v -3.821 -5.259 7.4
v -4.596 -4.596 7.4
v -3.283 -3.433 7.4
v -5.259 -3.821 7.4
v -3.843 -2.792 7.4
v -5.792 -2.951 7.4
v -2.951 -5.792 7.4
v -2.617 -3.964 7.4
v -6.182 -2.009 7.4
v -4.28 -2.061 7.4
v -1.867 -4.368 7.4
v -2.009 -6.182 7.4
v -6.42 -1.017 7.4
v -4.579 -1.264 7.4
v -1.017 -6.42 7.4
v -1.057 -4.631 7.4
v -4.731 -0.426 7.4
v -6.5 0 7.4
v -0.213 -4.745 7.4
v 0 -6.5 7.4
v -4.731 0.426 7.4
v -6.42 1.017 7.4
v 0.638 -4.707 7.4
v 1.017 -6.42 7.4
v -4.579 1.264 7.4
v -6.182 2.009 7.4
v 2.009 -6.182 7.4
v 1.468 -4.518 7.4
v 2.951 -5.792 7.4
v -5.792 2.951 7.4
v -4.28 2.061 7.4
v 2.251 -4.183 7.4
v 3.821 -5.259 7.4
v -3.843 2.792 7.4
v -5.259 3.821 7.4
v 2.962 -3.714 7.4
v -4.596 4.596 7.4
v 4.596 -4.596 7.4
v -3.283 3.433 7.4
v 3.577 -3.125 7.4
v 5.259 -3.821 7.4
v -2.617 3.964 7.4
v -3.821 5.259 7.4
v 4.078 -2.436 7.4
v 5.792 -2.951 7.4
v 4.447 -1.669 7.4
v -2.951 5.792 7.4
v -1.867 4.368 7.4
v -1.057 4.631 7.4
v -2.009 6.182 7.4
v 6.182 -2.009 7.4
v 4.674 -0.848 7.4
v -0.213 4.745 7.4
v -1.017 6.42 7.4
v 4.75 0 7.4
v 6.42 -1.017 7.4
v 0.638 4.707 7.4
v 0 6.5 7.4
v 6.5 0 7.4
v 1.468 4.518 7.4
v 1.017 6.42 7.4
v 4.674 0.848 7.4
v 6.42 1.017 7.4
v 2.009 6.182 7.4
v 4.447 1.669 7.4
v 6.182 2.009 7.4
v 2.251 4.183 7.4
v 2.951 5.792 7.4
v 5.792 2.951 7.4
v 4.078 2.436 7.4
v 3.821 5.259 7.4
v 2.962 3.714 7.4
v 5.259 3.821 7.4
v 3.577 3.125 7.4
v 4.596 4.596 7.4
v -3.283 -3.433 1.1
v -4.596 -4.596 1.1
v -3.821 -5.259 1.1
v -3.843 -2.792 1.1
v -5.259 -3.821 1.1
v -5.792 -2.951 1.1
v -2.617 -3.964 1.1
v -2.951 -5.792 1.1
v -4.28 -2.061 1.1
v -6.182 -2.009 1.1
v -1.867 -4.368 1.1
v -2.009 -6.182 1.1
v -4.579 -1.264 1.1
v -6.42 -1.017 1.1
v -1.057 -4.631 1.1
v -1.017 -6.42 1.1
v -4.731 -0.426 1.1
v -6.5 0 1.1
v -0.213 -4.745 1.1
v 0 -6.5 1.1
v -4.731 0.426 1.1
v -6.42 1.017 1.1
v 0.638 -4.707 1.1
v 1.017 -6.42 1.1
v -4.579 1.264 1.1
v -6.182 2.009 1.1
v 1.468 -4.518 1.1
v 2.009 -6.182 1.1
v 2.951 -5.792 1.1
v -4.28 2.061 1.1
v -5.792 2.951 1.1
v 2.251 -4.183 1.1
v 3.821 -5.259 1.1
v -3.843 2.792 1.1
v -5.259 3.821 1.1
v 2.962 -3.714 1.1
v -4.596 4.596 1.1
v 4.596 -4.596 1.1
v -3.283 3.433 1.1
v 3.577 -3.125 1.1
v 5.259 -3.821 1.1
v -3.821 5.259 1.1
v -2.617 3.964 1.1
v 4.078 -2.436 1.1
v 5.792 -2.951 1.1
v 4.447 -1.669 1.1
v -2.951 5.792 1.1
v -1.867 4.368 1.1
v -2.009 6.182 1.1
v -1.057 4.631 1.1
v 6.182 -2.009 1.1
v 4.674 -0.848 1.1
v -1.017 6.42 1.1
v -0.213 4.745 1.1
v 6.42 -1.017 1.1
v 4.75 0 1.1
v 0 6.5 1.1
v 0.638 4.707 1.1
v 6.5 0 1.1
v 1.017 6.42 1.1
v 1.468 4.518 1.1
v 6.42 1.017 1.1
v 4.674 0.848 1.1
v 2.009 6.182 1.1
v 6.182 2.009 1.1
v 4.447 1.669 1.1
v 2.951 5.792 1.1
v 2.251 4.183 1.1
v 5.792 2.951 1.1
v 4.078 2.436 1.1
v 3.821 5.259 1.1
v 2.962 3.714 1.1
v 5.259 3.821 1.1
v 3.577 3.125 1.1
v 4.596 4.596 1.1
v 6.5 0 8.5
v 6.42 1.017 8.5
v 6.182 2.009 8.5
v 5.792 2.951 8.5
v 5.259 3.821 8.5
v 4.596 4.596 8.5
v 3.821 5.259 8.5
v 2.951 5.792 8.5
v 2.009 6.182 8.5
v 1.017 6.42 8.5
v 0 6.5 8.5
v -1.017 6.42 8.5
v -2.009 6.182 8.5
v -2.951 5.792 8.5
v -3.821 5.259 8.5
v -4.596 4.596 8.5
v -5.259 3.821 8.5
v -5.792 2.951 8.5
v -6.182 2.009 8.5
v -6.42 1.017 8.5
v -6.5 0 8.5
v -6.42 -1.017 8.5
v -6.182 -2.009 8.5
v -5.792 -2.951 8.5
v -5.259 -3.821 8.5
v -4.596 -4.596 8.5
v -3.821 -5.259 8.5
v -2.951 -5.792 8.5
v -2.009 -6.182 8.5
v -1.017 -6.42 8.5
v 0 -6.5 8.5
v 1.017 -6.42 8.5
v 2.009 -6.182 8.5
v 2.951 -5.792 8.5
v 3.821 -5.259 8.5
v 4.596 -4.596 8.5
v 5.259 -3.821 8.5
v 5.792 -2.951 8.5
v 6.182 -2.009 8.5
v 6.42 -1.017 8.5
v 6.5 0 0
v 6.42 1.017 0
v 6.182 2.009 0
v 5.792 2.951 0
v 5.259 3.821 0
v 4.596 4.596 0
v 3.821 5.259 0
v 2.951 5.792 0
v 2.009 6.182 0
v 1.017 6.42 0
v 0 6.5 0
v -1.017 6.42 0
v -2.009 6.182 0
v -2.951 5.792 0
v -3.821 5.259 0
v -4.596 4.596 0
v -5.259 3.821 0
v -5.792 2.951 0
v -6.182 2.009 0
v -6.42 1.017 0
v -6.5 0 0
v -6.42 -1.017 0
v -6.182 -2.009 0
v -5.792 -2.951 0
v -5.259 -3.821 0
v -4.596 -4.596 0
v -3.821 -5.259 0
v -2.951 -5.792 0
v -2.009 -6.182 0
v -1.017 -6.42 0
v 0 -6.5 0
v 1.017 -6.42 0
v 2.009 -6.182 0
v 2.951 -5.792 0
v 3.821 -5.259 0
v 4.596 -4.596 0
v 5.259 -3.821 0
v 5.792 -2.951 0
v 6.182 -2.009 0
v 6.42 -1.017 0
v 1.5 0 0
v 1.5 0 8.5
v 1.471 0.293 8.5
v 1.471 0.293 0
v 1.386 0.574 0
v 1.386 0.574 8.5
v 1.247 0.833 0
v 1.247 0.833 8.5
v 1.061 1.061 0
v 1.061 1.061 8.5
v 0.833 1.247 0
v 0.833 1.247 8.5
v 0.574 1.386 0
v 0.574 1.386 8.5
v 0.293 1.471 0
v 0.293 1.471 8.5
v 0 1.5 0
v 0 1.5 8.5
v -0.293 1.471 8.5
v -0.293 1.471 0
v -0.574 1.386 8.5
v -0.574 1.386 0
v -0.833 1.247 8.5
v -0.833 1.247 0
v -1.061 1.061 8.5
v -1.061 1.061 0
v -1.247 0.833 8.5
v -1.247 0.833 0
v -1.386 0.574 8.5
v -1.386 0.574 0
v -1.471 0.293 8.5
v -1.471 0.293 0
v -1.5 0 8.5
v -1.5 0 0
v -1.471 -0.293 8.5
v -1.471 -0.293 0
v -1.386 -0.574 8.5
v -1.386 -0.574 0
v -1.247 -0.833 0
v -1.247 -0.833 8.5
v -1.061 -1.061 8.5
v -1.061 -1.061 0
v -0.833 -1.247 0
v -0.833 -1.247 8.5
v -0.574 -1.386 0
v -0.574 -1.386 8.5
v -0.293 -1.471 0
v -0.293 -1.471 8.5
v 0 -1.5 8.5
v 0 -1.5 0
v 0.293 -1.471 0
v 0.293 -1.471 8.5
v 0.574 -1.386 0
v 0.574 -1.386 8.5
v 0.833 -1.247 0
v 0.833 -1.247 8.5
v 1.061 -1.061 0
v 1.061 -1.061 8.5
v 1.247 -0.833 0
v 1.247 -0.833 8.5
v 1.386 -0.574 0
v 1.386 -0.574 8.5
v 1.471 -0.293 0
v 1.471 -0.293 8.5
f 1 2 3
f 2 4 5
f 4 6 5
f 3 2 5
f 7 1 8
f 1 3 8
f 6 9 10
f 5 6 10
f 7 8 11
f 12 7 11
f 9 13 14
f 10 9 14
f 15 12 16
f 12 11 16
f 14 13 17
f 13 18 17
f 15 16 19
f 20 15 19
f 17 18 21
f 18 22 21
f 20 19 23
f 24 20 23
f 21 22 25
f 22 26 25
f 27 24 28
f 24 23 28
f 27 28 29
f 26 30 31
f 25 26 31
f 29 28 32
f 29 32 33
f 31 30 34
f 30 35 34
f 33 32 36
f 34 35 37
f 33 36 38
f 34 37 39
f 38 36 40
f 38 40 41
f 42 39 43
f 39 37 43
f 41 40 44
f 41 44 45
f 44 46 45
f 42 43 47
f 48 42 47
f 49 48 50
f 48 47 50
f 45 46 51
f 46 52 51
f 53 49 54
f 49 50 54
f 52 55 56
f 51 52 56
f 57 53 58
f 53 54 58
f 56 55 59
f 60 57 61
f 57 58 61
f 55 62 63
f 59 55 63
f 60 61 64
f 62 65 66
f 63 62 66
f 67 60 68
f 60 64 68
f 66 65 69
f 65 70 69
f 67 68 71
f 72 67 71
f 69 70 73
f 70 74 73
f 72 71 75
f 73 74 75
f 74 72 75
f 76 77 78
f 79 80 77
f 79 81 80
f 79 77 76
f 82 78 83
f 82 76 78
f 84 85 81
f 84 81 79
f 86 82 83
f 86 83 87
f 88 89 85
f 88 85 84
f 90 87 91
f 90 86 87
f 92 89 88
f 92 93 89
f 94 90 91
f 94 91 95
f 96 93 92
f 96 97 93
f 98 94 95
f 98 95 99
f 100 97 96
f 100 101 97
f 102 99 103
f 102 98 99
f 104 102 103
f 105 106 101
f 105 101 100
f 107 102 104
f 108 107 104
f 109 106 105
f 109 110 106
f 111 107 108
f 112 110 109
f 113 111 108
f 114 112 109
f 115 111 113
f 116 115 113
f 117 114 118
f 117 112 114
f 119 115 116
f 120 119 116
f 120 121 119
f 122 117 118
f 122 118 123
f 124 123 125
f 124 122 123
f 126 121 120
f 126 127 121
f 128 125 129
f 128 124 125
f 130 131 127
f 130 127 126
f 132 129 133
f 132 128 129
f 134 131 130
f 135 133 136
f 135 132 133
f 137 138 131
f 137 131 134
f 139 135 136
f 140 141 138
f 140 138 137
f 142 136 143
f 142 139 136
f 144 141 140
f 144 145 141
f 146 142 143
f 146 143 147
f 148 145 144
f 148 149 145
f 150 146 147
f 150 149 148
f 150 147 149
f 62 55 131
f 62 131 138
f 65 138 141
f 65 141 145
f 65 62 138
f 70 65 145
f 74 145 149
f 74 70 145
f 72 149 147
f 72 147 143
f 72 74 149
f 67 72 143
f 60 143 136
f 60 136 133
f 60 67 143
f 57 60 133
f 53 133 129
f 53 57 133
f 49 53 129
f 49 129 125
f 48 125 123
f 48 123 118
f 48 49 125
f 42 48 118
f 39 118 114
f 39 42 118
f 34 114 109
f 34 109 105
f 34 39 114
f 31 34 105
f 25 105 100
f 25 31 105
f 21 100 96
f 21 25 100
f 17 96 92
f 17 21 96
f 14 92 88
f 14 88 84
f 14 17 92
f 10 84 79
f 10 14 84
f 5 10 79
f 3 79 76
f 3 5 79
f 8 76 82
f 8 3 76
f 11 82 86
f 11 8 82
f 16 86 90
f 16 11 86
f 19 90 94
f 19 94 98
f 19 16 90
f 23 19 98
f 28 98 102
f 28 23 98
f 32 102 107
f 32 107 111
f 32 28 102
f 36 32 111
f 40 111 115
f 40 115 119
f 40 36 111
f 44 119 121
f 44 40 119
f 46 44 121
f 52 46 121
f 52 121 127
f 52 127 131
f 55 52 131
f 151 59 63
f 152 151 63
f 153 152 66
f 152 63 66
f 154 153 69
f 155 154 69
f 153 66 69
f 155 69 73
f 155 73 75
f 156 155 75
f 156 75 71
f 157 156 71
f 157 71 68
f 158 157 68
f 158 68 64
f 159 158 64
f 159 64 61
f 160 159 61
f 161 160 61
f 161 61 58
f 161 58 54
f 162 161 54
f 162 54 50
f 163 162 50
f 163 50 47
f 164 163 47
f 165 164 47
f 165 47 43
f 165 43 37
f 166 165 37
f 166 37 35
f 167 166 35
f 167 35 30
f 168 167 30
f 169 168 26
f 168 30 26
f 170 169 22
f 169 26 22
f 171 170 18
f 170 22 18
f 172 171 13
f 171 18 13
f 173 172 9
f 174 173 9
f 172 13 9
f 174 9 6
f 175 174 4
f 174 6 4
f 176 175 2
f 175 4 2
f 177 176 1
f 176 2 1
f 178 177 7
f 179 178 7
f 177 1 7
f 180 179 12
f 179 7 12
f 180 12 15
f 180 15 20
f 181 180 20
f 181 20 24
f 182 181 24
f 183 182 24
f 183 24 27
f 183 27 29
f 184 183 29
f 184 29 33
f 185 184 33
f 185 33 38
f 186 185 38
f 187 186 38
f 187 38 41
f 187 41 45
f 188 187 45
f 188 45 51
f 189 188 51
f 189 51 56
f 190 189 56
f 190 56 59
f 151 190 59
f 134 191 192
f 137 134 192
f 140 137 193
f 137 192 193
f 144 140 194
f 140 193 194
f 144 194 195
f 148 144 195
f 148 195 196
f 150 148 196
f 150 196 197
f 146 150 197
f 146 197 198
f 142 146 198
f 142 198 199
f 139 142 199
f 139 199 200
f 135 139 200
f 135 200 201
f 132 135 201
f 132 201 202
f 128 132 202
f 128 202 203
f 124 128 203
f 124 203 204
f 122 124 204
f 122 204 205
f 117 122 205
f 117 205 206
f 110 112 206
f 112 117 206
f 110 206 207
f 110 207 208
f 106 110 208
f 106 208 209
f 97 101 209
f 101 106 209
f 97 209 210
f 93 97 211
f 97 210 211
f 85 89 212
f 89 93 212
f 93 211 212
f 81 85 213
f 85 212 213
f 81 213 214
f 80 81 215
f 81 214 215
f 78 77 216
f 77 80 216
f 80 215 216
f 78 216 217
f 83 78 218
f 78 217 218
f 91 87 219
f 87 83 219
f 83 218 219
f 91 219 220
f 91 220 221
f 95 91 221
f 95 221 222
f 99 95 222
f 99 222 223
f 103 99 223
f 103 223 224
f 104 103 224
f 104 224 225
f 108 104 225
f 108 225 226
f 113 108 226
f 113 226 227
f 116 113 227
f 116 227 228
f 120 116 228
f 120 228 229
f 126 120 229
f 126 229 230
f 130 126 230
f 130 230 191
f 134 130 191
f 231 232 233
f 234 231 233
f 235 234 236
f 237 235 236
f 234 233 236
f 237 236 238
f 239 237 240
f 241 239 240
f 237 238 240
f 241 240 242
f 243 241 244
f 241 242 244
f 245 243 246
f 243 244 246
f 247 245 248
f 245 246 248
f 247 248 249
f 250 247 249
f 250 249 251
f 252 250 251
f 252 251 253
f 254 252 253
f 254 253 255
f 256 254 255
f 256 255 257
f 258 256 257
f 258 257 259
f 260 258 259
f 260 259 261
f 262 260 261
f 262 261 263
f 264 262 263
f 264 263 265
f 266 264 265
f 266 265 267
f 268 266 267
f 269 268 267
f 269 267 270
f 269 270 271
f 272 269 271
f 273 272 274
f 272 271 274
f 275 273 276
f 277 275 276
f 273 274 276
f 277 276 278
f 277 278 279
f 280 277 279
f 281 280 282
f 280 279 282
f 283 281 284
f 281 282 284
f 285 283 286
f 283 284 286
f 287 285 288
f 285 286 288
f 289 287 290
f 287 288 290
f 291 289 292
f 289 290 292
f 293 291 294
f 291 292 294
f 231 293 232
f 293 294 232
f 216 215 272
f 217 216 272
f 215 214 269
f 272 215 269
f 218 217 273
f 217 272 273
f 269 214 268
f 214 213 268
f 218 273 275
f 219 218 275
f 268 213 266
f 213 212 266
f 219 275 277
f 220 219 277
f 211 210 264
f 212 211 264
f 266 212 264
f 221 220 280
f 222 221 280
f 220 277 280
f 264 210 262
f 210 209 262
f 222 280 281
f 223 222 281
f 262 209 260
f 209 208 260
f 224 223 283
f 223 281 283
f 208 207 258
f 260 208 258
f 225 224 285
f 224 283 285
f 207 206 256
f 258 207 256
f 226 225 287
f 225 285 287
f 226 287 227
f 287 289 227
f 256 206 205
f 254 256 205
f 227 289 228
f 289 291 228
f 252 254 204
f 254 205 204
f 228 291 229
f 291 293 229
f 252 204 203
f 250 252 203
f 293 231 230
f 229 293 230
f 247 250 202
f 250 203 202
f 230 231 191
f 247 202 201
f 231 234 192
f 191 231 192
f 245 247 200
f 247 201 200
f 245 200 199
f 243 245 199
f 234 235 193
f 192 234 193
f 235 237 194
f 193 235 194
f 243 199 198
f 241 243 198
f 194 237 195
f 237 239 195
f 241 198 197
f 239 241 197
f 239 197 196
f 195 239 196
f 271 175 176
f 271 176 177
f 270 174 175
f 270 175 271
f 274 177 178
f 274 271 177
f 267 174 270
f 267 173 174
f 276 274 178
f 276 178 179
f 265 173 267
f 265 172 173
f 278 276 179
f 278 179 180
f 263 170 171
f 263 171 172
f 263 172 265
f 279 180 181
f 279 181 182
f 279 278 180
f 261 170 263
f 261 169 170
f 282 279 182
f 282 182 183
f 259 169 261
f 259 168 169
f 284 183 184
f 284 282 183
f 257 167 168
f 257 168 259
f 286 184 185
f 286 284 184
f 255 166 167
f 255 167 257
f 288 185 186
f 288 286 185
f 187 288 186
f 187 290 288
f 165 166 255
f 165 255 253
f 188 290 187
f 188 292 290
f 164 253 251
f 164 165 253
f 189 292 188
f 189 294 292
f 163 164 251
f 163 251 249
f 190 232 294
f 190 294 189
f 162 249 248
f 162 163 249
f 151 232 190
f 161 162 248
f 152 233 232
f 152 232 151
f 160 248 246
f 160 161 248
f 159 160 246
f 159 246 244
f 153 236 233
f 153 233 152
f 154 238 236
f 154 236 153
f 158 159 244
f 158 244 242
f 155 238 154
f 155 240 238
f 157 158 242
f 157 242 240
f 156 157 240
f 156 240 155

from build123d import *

# Parameters (mm, degrees)
SKETCH_1_R          = 6.5
EXTRUDE_1_DEPTH     = 8.5
SKETCH_2_R          = 1.5
CUT_EXTRUDE_1_DEPTH = 10
SKETCH_3_R          = 9
SKETCH_3_R_2        = 4.75
CUT_EXTRUDE_2_DEPTH = 6.3


with BuildPart() as part:
    # 草图1 → 凸台-拉伸1 (new body)
    with BuildSketch(Plane.XY):
        Circle(SKETCH_1_R)
    extrude(amount=EXTRUDE_1_DEPTH)

    # 草图2 → 切除-拉伸1 (cut)
    with BuildSketch(Plane.XY.offset(8.5)):
        Circle(SKETCH_2_R)
    extrude(amount=-CUT_EXTRUDE_1_DEPTH, mode=Mode.SUBTRACT)

    # 草图3 → 切除-拉伸2 (cut)
    with BuildSketch(Plane.XY.offset(7.4)):
        Circle(SKETCH_3_R)
        Circle(SKETCH_3_R_2, mode=Mode.SUBTRACT)
    extrude(amount=-CUT_EXTRUDE_2_DEPTH, mode=Mode.SUBTRACT)


solid = part.part
